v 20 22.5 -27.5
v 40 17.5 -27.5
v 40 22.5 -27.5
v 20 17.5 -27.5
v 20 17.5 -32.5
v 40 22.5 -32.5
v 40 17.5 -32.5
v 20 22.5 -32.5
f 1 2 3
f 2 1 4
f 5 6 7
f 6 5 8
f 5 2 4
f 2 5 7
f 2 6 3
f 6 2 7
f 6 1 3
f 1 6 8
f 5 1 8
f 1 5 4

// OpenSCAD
// Generated by generate_scads.py
translate([30,20,-30]) {
  cube(size=[20,5,5], center=true);
}
